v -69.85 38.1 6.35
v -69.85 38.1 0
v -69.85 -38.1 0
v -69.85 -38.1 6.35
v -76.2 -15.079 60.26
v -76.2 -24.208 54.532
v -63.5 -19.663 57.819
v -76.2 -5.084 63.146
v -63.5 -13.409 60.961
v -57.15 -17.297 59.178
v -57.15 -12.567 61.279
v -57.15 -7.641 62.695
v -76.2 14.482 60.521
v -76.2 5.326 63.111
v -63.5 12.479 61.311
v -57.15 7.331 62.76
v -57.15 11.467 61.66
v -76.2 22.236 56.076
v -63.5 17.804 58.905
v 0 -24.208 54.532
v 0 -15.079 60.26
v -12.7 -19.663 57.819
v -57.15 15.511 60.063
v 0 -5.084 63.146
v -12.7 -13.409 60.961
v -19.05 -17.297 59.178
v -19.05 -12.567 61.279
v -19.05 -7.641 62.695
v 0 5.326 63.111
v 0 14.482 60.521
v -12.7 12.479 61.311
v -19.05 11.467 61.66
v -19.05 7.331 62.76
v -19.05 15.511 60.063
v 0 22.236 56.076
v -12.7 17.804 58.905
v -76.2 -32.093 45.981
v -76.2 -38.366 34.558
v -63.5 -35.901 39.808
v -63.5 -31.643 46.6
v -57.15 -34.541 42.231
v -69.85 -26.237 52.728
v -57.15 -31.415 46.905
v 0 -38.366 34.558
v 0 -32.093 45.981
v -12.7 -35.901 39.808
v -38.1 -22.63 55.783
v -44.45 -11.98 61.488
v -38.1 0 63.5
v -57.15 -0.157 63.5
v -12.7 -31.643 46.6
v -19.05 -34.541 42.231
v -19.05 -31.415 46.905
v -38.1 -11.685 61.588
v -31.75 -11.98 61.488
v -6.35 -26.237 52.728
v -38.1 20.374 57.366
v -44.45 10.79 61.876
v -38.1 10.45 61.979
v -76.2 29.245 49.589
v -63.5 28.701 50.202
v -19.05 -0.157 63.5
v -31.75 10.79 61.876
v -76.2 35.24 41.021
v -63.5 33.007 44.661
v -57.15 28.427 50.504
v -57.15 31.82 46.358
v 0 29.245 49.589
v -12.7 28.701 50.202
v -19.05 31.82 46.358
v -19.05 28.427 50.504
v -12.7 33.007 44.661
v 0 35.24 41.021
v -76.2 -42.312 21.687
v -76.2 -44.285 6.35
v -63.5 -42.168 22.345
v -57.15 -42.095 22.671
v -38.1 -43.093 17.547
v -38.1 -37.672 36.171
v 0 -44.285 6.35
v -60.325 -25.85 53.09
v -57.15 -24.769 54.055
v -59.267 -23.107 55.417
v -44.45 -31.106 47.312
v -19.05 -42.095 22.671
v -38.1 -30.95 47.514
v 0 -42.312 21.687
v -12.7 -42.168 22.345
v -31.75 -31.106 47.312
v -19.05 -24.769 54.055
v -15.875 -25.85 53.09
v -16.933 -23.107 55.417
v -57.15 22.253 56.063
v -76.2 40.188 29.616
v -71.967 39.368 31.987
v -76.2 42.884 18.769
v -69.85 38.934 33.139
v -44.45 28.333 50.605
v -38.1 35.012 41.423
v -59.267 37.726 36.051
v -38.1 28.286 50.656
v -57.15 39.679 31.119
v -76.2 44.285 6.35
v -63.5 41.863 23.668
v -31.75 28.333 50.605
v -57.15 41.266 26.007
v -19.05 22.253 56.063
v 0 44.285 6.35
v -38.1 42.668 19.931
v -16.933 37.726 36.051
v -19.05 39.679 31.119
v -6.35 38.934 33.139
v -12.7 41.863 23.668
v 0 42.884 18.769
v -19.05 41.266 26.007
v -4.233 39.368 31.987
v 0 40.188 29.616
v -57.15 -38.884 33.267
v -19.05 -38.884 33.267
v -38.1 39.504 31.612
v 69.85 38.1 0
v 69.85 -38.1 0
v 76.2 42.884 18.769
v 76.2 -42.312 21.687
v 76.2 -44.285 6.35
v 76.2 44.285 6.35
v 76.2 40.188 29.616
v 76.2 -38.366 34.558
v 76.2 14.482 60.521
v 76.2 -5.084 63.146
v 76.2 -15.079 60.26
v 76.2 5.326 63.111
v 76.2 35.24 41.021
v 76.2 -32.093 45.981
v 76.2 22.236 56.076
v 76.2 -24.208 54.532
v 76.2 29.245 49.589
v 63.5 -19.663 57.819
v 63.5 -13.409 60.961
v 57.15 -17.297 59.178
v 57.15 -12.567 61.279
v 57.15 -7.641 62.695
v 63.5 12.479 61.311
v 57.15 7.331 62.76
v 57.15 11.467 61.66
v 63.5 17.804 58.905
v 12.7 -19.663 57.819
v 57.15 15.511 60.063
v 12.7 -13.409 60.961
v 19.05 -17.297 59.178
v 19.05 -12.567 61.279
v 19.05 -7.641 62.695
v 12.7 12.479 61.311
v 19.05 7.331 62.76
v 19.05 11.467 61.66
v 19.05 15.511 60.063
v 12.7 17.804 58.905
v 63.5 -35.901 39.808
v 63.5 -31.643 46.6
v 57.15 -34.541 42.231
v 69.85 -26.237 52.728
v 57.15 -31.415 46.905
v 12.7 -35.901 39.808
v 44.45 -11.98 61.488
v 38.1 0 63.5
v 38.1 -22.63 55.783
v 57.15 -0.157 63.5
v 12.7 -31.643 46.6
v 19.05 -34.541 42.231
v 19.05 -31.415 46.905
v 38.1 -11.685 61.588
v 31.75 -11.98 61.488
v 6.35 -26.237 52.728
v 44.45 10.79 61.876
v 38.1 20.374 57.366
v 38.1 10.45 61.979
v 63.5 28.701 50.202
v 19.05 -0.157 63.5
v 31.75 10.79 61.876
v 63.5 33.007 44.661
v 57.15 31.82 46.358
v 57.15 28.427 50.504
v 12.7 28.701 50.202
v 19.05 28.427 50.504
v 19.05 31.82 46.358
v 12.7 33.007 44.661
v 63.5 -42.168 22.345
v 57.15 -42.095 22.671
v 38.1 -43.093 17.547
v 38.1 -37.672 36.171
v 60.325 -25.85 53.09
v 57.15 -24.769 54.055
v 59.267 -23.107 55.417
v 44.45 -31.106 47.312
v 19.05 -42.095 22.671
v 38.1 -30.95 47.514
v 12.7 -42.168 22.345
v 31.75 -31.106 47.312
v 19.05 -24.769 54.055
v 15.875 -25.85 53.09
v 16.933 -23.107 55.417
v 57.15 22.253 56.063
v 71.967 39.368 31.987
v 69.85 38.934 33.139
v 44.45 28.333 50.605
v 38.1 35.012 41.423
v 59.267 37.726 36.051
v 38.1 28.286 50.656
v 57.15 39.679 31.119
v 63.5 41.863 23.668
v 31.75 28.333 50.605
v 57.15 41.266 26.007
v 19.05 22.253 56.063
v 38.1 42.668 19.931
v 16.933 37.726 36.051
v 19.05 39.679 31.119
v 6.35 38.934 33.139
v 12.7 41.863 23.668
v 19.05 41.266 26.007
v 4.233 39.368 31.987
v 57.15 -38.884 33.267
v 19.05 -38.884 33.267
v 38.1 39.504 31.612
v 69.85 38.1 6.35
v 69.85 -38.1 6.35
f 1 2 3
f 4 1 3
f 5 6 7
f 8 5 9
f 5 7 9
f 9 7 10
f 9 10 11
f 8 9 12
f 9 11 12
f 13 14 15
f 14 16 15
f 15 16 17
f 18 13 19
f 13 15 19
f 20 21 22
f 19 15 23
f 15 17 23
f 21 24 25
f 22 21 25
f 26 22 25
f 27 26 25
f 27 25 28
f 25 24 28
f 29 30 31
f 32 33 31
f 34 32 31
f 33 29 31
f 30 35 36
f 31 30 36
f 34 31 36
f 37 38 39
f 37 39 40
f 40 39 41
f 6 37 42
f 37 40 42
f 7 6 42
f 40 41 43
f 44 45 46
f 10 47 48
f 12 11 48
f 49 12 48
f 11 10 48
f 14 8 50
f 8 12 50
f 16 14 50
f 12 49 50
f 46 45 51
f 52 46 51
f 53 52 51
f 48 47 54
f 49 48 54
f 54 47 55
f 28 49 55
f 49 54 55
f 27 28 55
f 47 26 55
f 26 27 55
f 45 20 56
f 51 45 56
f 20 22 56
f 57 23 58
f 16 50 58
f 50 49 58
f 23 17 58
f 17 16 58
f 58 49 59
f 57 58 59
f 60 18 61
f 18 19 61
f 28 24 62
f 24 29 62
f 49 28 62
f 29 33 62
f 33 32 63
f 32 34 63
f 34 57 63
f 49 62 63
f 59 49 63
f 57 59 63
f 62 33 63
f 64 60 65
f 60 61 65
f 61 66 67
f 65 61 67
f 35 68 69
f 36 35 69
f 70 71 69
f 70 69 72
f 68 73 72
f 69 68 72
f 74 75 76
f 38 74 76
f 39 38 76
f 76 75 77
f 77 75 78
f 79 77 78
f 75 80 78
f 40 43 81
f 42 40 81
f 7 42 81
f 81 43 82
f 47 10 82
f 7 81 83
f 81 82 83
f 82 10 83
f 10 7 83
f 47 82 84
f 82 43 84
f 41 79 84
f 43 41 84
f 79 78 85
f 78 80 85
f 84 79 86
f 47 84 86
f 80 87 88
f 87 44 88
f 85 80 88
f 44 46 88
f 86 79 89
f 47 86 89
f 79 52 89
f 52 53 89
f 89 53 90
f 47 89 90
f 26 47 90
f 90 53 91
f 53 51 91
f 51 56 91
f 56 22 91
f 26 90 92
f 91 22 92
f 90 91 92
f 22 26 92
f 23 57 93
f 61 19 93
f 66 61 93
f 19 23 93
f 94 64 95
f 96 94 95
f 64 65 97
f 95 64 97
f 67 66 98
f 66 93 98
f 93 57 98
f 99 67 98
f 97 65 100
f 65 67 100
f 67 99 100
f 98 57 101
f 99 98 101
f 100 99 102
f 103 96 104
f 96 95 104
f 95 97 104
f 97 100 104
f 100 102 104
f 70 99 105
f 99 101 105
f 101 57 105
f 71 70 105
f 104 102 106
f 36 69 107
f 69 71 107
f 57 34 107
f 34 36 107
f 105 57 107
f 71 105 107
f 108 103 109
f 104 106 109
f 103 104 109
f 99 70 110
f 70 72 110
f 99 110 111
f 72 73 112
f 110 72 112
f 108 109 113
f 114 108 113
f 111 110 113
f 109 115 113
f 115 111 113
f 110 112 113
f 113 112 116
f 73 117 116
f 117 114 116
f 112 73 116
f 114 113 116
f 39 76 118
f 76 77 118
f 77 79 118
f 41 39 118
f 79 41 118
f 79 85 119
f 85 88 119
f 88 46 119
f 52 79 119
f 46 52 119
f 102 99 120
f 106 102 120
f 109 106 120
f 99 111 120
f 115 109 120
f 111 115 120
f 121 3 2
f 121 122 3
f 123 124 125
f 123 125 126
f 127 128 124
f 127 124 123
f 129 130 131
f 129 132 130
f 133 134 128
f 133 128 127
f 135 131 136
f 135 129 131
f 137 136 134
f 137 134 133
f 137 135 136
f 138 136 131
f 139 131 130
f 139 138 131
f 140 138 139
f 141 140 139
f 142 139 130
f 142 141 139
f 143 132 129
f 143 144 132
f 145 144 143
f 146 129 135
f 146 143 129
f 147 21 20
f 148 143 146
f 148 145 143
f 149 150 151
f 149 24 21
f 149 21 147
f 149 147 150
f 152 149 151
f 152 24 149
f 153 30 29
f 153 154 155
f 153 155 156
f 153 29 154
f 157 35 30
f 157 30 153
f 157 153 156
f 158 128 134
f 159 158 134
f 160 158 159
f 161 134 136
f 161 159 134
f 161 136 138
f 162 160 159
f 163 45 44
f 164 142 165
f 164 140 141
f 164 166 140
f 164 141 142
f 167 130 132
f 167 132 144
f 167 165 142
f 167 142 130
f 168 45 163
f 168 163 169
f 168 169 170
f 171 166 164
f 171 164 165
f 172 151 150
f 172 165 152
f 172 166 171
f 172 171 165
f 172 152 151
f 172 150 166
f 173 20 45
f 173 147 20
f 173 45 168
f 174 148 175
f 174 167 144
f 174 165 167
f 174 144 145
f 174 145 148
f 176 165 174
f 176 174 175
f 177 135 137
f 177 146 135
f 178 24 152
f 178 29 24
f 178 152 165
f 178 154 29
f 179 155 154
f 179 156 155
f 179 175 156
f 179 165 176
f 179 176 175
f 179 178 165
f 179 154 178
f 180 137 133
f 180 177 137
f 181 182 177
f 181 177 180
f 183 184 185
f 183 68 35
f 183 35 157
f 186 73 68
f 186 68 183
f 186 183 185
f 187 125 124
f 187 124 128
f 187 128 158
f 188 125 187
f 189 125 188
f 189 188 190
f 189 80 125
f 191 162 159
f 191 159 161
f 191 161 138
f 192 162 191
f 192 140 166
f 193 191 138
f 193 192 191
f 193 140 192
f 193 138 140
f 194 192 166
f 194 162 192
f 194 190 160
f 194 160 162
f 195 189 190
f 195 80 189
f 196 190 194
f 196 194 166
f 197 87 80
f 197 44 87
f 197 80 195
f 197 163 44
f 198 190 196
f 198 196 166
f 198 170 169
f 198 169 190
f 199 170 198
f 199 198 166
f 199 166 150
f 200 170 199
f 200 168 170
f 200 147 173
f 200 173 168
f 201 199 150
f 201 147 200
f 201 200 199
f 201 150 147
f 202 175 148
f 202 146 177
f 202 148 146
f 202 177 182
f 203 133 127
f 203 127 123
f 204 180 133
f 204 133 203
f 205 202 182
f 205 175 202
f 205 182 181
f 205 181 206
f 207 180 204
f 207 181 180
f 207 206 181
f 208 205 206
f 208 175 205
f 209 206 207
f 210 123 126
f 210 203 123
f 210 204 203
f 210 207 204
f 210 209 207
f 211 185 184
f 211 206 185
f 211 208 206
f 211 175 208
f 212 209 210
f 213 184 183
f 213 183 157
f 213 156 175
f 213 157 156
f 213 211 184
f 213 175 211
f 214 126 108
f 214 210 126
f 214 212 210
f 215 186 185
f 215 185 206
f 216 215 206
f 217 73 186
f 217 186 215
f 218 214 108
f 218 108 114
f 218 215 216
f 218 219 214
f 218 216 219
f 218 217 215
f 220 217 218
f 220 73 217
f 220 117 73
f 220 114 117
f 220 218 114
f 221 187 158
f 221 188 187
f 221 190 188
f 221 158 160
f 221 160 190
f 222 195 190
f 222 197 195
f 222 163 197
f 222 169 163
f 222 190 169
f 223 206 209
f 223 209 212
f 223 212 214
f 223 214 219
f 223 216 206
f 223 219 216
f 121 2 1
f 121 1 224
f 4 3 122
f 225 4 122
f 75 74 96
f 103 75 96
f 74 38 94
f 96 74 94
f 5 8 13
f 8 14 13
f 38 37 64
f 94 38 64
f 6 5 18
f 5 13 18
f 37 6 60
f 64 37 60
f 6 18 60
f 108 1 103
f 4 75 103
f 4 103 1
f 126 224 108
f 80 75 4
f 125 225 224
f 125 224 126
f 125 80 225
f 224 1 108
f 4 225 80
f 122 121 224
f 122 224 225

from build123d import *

# Parameters (mm, degrees)
F1_DEPTH = 76.2
F2_DEPTH = 76.2
F3_W     = 139.7
F3_H     = 76.2
F4_DEPTH = 6.35


with BuildPart() as f1:
    # F0 (on Right) → F1 (new body)
    with BuildSketch(Plane.YZ):
        with BuildLine():
            Line((-44.45, 0), (44.45, 0))
            add(Edge.make_bspline(
                [(0, 63.5), (22.225, 63.5), (44.45, 43.3620624244), (44.45, 0)],
                knots=[0.5, 0.5, 0.5, 0.5, 1, 1, 1, 1], degree=3))
            add(Edge.make_bspline(
                [(-44.45, 0), (-44.45, 43.3620624244), (-22.225, 63.5), (0, 63.5)],
                knots=[0, 0, 0, 0, 0.5, 0.5, 0.5, 0.5], degree=3))
        make_face()
    extrude(amount=F1_DEPTH)

    # F2 (add): a face of the model
    f2_faces = [f1.faces().sort_by_distance(p)[0] for p in [
        (0, 0, 27.2904966015),
    ]]
    extrude(f2_faces, amount=F2_DEPTH)

    # F3 (on face) → F4 (cut)
    with BuildSketch(Plane(origin=(0, 0, 0), x_dir=(1, 0, 0), z_dir=(0, 0, -1))):
        Polygon((76.2, -44.45), (76.2, 44.45), (0, 44.45), (-76.2, 44.45), (-76.2, -44.45), (0, -44.45), align=None)
        Rectangle(F3_W, F3_H, mode=Mode.SUBTRACT)
    extrude(amount=-F4_DEPTH, mode=Mode.SUBTRACT)


solid = f1.part
